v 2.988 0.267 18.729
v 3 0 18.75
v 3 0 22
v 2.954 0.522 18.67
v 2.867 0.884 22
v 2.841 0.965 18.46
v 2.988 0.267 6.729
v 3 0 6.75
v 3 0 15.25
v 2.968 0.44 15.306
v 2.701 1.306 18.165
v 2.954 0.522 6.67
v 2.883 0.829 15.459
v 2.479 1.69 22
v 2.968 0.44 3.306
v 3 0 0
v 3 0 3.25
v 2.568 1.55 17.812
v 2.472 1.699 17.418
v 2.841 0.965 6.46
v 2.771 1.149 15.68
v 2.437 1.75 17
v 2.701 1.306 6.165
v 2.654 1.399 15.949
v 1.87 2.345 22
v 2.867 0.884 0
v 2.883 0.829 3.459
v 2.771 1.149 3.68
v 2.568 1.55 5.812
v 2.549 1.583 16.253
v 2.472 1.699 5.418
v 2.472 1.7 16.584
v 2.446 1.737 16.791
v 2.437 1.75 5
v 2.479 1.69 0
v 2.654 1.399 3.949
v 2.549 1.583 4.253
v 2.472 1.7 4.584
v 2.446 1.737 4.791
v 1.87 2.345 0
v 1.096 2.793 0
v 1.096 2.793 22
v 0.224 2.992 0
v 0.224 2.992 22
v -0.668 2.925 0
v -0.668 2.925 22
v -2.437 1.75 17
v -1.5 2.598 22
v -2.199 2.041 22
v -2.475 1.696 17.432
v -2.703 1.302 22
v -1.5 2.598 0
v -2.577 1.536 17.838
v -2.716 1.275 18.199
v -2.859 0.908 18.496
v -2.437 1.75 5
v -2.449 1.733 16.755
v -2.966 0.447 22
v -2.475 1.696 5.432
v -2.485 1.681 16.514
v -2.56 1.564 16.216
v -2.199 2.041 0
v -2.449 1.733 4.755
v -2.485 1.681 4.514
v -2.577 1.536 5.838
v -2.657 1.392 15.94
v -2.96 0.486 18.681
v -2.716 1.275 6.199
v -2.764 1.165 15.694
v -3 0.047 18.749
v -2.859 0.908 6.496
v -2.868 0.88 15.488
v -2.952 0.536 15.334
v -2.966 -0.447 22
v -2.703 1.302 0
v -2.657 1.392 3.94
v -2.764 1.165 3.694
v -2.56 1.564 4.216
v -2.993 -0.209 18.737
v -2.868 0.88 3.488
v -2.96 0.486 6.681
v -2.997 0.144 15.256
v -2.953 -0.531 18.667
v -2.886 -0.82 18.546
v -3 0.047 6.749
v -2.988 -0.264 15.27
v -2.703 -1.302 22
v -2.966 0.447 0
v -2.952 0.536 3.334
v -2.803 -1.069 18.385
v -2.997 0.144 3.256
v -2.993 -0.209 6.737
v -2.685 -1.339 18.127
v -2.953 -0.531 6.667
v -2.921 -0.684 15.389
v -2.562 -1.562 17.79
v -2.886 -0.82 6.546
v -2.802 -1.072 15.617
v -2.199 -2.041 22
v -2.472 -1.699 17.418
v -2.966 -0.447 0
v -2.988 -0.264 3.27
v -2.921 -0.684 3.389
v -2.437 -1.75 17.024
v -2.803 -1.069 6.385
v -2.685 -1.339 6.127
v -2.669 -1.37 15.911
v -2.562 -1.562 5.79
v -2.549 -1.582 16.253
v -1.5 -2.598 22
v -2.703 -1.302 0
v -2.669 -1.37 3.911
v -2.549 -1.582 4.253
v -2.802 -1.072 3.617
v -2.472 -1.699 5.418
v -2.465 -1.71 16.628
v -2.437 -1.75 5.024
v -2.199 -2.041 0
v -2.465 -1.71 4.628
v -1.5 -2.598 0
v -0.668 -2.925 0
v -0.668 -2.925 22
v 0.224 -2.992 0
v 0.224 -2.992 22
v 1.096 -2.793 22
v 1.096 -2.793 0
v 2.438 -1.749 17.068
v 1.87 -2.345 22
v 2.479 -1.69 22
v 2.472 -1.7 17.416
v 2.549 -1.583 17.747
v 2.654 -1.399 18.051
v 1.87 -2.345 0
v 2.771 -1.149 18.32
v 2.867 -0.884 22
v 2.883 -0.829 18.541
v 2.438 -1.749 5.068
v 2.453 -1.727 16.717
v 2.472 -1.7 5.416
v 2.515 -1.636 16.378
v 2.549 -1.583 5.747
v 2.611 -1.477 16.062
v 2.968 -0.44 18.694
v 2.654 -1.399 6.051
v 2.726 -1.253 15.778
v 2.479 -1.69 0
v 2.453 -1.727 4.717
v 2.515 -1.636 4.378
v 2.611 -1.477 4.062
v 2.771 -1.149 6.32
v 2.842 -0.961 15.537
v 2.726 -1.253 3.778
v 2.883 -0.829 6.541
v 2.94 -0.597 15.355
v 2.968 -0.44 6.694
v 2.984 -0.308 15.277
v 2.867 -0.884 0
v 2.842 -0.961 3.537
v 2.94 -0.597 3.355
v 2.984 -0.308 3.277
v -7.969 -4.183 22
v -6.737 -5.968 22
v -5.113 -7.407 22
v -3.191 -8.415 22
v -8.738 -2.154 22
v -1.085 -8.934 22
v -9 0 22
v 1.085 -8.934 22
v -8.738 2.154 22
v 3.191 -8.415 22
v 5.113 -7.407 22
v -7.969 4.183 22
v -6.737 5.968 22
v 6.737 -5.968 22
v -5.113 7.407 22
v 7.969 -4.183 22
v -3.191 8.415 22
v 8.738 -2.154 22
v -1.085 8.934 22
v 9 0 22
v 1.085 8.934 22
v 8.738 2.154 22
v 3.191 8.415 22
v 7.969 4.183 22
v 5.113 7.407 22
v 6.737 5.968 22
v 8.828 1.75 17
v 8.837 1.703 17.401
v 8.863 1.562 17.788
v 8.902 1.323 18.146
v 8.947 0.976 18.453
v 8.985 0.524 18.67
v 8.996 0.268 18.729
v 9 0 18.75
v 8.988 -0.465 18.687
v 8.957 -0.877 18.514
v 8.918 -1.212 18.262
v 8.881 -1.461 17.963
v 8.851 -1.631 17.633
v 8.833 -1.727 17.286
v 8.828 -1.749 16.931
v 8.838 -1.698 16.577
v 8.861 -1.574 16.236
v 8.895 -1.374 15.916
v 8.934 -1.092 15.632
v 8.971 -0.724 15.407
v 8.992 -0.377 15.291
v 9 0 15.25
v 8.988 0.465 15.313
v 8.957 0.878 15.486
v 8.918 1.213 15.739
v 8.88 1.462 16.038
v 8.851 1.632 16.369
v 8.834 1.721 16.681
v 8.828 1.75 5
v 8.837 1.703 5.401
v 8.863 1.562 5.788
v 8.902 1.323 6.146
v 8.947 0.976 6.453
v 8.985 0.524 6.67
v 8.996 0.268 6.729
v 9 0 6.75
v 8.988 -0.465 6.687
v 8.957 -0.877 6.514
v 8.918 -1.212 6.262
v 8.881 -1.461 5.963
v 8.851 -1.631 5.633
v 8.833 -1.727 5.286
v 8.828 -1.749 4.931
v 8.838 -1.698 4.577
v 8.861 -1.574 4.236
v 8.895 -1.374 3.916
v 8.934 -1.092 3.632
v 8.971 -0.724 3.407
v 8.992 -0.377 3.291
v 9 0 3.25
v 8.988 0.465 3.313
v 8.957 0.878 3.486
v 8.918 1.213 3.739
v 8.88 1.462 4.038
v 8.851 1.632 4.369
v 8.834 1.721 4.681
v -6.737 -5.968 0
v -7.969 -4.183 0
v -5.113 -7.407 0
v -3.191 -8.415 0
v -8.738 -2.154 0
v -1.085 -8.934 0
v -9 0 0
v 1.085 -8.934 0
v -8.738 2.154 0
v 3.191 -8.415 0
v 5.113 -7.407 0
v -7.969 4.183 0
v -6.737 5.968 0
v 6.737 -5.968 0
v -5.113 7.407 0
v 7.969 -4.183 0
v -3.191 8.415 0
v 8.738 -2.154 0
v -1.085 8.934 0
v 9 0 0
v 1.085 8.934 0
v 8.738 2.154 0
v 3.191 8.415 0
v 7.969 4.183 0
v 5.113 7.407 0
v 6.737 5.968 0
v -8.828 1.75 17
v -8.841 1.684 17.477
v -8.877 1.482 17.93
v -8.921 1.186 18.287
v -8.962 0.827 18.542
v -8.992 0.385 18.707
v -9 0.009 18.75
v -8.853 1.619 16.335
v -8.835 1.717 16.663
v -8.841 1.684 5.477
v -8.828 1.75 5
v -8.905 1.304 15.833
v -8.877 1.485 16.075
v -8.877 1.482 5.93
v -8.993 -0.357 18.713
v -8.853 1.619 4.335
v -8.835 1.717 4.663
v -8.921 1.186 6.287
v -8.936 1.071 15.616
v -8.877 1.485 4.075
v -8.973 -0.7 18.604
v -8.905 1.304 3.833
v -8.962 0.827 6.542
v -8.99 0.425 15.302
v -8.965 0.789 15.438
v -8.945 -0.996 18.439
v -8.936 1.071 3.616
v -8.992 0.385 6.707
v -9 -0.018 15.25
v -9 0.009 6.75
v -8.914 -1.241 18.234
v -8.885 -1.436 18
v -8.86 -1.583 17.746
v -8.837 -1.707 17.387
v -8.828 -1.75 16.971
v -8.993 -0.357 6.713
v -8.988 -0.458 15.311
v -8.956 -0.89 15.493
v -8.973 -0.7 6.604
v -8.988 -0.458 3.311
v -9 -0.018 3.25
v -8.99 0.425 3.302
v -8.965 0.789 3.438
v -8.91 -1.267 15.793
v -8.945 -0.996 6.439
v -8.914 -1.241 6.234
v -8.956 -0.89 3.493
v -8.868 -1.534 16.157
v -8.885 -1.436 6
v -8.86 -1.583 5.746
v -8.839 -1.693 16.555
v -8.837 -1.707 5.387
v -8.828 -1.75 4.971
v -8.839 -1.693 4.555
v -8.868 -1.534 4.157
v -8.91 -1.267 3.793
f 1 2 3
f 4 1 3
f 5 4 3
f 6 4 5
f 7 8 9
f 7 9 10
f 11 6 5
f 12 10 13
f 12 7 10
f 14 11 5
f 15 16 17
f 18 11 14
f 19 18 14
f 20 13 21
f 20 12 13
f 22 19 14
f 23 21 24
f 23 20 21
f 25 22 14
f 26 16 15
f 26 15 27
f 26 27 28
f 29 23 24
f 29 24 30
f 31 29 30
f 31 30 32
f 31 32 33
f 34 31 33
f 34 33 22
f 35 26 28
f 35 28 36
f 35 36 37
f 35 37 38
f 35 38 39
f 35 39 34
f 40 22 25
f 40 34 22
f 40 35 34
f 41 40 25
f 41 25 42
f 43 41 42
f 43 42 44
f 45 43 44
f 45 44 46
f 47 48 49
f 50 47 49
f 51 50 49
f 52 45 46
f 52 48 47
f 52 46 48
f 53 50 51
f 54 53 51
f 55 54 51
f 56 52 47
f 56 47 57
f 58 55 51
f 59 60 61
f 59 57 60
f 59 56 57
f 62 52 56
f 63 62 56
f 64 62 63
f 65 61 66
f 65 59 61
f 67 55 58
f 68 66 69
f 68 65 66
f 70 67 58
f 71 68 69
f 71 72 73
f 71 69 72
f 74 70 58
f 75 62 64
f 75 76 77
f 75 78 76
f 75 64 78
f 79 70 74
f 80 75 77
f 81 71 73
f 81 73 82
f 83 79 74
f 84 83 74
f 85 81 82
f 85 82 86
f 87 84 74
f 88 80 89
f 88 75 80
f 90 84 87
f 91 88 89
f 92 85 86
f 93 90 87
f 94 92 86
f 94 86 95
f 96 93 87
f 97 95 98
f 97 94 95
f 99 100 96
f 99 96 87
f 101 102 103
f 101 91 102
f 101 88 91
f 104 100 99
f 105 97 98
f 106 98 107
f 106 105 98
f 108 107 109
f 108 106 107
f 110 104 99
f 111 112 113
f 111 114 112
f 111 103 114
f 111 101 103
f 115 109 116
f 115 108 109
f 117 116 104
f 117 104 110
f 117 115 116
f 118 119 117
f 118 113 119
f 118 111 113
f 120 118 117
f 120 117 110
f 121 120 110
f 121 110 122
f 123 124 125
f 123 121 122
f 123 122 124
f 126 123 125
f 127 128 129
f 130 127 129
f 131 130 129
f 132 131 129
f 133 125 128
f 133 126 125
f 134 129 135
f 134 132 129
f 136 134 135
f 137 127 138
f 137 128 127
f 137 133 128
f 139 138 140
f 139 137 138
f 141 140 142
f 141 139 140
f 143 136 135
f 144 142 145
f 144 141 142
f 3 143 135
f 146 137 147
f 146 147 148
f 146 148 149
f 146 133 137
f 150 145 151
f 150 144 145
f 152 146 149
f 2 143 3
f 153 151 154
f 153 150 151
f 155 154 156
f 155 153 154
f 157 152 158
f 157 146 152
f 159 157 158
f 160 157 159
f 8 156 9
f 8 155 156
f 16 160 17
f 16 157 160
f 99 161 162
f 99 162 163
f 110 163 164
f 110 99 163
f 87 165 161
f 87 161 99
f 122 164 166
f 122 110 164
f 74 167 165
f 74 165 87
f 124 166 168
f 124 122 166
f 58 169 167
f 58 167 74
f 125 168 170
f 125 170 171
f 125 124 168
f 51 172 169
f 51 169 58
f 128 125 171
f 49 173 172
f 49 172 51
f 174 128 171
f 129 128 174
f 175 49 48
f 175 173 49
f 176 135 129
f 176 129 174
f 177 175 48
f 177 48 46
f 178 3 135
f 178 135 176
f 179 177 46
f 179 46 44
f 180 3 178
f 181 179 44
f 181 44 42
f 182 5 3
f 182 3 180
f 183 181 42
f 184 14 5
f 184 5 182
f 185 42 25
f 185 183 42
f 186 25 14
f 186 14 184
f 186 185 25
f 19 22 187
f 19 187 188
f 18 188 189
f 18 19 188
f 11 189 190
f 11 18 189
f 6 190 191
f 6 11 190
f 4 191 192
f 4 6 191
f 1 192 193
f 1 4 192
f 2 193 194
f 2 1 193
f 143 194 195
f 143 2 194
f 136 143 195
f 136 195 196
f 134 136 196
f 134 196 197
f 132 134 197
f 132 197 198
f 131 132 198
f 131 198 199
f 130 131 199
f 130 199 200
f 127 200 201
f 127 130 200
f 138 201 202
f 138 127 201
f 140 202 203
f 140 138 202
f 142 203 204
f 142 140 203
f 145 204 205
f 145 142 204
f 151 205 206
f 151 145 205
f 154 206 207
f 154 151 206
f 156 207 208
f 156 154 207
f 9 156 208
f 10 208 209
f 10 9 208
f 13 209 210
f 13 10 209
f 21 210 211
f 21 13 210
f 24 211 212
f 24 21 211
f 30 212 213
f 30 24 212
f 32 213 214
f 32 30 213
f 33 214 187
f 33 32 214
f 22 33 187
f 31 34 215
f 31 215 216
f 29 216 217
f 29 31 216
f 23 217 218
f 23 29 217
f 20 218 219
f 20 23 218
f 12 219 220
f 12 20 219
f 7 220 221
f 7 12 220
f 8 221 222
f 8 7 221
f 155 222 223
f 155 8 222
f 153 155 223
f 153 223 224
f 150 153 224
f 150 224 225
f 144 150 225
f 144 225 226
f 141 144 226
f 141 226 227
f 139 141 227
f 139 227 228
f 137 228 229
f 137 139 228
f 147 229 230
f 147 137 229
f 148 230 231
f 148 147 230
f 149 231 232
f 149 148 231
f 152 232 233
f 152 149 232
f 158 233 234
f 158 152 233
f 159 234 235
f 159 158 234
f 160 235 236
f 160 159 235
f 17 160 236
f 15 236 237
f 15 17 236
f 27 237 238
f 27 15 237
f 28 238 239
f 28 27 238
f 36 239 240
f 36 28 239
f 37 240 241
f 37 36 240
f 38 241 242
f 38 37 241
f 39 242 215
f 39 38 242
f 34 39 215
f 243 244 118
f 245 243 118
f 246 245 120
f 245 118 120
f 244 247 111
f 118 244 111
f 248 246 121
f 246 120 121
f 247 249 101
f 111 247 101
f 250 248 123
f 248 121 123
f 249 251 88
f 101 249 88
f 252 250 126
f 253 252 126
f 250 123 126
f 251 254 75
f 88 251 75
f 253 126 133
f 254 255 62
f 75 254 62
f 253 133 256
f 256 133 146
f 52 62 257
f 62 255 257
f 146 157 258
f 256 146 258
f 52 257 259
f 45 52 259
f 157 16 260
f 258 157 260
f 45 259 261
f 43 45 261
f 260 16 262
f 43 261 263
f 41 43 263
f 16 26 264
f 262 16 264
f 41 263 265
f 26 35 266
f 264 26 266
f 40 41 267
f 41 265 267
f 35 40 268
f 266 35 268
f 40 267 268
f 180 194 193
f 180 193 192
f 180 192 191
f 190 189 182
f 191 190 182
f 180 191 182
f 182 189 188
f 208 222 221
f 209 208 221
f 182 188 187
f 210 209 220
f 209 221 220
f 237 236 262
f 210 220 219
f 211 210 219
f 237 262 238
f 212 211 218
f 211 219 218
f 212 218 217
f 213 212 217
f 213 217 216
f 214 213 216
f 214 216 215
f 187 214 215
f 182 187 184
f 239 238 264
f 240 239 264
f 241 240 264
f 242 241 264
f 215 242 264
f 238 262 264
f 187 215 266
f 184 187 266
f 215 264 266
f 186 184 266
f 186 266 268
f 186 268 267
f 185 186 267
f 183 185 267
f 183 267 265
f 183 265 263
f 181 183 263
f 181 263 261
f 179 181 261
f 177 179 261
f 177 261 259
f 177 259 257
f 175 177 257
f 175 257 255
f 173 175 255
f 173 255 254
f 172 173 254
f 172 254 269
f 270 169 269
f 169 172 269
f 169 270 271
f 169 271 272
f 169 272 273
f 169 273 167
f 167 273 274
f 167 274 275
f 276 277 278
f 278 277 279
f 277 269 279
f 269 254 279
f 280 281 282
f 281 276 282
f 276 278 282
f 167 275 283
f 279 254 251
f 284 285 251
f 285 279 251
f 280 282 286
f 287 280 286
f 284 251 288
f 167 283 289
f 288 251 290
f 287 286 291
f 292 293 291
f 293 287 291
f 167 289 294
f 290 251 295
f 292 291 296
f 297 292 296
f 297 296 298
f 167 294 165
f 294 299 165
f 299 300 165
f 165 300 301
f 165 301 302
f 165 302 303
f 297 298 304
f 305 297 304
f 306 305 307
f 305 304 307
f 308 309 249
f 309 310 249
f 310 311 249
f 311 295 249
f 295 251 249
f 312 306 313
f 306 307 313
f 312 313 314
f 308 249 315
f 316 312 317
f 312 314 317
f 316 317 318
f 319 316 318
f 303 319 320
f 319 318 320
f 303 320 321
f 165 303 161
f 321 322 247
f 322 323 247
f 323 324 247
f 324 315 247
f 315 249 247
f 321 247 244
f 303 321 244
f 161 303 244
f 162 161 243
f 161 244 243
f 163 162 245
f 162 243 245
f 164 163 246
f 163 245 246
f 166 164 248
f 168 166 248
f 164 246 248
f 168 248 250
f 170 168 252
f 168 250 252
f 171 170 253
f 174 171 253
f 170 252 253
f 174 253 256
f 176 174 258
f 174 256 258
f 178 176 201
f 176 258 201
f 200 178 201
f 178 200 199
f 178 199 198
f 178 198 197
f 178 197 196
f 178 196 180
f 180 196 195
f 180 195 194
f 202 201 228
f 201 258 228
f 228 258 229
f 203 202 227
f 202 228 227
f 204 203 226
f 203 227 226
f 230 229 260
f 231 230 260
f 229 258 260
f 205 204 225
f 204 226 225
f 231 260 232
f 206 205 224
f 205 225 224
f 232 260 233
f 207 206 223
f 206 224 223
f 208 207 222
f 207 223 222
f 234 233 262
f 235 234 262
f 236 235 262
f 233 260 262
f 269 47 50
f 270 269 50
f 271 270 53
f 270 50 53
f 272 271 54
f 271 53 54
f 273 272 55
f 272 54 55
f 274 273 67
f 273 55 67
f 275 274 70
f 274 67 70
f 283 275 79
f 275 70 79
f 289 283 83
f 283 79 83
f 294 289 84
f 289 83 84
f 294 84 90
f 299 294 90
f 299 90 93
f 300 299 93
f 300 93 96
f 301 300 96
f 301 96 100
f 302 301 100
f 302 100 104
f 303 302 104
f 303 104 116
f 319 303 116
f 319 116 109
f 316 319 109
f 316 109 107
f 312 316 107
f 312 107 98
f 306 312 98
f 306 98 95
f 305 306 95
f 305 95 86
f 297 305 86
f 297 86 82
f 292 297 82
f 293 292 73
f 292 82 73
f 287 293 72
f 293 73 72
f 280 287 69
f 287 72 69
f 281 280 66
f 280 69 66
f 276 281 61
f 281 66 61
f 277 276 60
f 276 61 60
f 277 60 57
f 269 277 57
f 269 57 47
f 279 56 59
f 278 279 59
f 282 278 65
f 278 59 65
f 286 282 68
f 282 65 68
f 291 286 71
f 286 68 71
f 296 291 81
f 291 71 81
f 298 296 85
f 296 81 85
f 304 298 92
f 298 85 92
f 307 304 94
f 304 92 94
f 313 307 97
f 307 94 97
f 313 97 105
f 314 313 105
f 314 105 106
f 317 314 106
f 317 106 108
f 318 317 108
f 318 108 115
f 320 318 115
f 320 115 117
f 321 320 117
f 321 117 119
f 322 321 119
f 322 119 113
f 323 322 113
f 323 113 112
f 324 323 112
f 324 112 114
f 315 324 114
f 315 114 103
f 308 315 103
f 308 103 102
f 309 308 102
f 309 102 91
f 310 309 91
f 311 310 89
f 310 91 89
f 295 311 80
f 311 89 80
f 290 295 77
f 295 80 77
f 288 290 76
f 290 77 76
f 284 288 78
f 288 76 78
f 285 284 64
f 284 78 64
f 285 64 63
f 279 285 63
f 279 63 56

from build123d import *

# Parameters (mm, degrees)
F0_R          = 9
F0_R_2        = 3
F1_DEPTH      = 22
F2_R          = 1.75
F3_DEPTH      = 9.001
F3_DEPTH_BACK = 25


with BuildPart() as f1:
    # F0 (on Top) → F1 (new body)
    with BuildSketch(Plane.XY):
        Circle(F0_R)
        Circle(F0_R_2, mode=Mode.SUBTRACT)
    extrude(amount=F1_DEPTH)

    # F2 (on Right) → F3 (cut, two sides)
    with BuildSketch(Plane.YZ) as f3_sk:
        with Locations((0, 5)):
            Circle(F2_R)
        with Locations((0, 17)):
            Circle(F2_R)
    extrude(amount=-F3_DEPTH, mode=Mode.SUBTRACT)
    extrude(f3_sk.sketch, amount=F3_DEPTH_BACK, mode=Mode.SUBTRACT)


solid = f1.part
